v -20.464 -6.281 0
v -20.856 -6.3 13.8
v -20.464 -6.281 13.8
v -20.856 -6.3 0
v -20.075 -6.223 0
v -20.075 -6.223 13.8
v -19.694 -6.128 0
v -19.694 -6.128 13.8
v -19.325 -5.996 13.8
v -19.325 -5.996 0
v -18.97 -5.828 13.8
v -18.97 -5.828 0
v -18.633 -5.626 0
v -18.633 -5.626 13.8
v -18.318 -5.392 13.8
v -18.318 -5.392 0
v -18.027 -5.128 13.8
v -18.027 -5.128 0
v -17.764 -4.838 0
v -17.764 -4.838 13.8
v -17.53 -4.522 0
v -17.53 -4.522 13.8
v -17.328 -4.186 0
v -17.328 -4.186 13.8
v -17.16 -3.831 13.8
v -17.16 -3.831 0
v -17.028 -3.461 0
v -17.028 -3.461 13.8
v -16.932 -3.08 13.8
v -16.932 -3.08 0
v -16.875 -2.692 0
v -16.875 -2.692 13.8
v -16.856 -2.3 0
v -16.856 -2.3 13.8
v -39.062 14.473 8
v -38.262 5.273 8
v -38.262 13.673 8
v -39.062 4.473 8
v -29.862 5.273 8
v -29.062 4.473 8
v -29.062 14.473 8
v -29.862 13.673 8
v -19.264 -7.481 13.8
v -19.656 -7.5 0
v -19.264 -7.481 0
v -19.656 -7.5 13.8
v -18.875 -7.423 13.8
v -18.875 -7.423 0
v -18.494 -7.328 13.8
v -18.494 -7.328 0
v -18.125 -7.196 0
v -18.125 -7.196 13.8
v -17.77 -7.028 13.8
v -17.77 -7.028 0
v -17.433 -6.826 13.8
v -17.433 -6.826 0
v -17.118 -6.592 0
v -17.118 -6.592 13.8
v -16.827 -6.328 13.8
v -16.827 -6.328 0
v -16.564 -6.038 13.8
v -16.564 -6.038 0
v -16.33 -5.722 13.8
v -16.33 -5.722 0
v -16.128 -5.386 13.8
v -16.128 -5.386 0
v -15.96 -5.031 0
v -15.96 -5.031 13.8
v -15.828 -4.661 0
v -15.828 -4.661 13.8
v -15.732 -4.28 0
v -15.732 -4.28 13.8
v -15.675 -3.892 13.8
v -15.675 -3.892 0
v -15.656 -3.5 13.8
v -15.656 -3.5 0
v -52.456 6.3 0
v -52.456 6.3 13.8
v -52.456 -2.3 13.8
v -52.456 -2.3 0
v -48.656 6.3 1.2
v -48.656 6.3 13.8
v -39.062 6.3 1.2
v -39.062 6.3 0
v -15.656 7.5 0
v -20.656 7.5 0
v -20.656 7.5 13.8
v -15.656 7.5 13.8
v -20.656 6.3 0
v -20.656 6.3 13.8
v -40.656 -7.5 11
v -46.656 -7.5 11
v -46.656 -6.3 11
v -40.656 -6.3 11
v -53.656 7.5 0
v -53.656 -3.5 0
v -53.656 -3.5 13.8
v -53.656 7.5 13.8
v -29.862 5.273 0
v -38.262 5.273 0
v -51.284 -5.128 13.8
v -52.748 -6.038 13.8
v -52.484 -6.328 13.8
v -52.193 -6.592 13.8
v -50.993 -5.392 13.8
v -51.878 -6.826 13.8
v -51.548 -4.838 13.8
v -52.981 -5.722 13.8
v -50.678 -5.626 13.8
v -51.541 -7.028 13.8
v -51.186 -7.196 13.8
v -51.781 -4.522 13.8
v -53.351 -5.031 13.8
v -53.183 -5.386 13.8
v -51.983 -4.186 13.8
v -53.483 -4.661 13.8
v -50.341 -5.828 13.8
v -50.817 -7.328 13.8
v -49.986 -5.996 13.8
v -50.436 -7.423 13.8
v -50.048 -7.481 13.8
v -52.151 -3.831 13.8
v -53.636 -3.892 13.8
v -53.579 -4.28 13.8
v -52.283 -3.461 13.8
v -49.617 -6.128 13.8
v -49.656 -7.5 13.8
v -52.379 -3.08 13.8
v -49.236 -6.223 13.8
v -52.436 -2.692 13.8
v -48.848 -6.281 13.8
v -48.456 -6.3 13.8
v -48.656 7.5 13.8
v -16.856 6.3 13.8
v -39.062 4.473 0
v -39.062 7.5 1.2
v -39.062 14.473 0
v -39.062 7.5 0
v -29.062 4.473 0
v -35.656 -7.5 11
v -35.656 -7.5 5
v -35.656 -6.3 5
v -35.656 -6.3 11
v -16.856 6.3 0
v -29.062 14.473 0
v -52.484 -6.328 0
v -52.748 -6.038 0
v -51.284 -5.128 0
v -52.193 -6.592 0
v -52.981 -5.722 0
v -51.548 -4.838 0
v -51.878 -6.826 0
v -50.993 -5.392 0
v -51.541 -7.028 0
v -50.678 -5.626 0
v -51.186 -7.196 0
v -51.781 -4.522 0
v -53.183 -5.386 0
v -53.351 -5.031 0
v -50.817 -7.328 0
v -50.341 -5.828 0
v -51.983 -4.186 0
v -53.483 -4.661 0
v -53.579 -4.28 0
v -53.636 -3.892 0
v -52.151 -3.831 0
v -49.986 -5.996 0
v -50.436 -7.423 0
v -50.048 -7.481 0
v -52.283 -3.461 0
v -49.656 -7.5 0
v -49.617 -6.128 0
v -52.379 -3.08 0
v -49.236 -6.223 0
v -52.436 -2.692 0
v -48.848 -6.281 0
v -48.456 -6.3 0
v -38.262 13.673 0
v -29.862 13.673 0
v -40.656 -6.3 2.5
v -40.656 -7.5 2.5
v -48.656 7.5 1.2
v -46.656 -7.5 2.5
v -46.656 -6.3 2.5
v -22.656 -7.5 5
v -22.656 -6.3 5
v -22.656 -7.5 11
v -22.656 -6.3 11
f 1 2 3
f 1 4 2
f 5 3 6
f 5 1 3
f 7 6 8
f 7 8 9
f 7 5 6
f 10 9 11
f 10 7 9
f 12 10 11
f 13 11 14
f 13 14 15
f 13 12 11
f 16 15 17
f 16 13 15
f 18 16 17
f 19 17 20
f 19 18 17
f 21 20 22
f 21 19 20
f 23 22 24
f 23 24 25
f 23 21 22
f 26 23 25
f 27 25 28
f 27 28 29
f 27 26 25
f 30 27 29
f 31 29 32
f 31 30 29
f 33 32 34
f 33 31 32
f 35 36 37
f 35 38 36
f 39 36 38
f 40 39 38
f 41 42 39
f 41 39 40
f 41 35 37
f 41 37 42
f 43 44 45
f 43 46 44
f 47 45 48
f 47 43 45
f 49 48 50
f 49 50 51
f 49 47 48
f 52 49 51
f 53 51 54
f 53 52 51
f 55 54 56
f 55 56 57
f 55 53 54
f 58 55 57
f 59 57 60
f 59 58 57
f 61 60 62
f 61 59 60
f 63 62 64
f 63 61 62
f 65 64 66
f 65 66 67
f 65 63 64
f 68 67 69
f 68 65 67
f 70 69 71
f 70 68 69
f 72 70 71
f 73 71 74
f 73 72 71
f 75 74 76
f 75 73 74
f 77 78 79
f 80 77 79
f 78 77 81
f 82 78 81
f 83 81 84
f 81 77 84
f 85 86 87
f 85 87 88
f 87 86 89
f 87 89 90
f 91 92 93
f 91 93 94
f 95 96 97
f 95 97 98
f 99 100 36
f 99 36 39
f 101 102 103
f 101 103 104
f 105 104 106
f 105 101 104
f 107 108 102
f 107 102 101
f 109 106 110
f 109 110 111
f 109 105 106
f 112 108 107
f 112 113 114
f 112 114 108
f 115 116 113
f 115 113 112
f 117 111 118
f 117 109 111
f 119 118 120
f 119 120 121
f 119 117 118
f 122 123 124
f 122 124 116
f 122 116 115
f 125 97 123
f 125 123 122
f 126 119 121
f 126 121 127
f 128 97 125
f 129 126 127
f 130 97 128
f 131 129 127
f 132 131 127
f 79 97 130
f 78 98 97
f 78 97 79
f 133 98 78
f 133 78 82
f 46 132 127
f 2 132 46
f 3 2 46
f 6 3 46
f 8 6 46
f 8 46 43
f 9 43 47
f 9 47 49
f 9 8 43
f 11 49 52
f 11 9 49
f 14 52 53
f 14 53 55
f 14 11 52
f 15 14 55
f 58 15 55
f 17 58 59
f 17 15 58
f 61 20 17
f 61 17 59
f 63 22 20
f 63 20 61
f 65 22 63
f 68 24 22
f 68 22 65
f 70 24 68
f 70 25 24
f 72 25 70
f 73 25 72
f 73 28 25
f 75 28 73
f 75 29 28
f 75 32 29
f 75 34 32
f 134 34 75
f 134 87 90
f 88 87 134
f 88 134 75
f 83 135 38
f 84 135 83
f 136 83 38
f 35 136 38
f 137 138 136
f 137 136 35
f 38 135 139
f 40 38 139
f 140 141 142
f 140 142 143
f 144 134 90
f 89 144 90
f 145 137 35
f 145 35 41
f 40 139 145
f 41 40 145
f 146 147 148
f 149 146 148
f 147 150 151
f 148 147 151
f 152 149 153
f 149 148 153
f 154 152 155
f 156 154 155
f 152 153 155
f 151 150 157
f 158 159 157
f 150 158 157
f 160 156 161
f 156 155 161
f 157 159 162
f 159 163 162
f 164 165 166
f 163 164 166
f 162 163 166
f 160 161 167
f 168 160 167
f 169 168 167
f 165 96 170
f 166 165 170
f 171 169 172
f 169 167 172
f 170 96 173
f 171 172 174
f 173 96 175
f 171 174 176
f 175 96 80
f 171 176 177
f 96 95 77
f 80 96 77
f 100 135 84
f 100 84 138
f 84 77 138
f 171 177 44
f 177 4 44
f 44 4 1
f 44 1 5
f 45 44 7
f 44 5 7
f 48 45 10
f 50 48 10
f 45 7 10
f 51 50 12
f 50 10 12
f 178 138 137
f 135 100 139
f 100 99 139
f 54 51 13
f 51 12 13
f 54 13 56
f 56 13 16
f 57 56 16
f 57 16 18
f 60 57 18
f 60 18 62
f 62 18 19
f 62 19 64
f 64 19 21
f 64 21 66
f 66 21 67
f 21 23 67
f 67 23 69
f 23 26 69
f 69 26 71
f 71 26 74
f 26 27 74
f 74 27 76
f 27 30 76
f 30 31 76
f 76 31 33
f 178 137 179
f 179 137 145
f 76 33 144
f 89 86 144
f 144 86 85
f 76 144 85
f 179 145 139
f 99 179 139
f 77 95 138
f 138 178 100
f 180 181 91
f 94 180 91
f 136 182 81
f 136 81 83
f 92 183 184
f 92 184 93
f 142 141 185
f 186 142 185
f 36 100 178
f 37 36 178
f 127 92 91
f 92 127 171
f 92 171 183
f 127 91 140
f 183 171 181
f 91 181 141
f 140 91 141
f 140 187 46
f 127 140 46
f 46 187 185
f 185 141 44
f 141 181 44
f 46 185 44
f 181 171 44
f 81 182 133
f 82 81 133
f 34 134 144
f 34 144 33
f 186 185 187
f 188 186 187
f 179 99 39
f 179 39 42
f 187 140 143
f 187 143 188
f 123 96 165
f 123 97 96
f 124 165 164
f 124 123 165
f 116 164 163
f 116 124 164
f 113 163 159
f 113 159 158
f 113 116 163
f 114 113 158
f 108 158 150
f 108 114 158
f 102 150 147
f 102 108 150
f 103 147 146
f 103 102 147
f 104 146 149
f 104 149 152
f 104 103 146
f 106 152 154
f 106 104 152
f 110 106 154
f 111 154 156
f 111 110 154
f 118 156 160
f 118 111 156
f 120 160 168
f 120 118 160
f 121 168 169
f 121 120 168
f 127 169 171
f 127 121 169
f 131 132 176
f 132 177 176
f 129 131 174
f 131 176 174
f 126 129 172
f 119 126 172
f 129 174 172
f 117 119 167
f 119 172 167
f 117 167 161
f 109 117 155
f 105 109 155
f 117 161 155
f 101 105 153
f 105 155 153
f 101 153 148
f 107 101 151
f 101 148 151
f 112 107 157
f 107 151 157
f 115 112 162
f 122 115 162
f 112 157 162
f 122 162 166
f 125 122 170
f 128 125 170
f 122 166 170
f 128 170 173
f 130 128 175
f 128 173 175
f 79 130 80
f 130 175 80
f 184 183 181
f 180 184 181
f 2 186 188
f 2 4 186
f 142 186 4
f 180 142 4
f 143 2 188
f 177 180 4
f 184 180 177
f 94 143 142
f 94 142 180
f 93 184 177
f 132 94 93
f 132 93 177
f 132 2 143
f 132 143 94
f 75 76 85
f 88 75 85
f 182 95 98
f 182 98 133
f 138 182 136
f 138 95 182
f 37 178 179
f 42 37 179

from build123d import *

# Parameters (mm, degrees)
F0_W      = 38
F0_H      = 15
F1_DEPTH  = 15
F2_T      = -1.2
F3_W      = 13
F3_H      = 6
F3_W_2    = 6
F3_H_2    = 8.5
F4_DEPTH  = 1.2
F5_DEPTH  = 1.2
F6_DEPTH  = 25
F7_R      = 4
F8_W      = 28
F8_H      = 13.8
F9_DEPTH  = 1.2
F10_W     = 10
F10_H     = 10
F11_DEPTH = 8
F12_T     = -0.8
F13_DEPTH = 25
F14_W     = 9.5933079185
F14_H     = 1.2
F15_DEPTH = 1.2


with BuildPart() as f1:
    # F0 (on Top) → F1 (new body)
    with BuildSketch(Plane.XY):
        with Locations((-34.6555788131, 0)):
            Rectangle(F0_W, F0_H)
    extrude(amount=F1_DEPTH)

    # F2 (hollow: no face is removed)
    offset(amount=F2_T, mode=Mode.SUBTRACT)

    # F3 (on face) → F4 (cut, through all)
    with BuildSketch(Plane.XZ.offset(7.5)):
        with Locations((-29.1555788131, 8)):
            Rectangle(F3_W, F3_H)
        with Locations((-43.6555788131, 6.75)):
            Rectangle(F3_W_2, F3_H_2)
    extrude(amount=-F4_DEPTH, mode=Mode.SUBTRACT)

    # F5 (cut, through all): a face of the model
    f5_faces = [f1.faces().sort_by_distance(p)[0] for p in [
        (-34.6555788131, 0, 15),
    ]]
    extrude(f5_faces, amount=-F5_DEPTH, mode=Mode.SUBTRACT)

    # F6 (cut): a face of the model
    f6_faces = [f1.faces().sort_by_distance(p)[0] for p in [
        (-34.6555788131, 0, 1.2),
    ]]
    extrude(f6_faces, amount=-F6_DEPTH, mode=Mode.SUBTRACT)

    # F7
    f7_edges = [f1.edges().sort_by_distance(p)[0] for p in [
        (-15.655579, -7.5, 6.9),
        (-52.455579, -6.3, 6.9),
        (-53.655579, -7.5, 6.9),
        (-16.855579, -6.3, 6.9),
    ]]
    fillet(f7_edges, radius=F7_R)

    # F8 (on face) → F9 (cut, through all)
    with BuildSketch(Plane(origin=(0, 7.5, 0), x_dir=(-1, 0, 0), z_dir=(0, 1, 0))):
        with Locations((34.6555788131, 6.9)):
            Rectangle(F8_W, F8_H)
    extrude(amount=-F9_DEPTH, mode=Mode.SUBTRACT)



with BuildPart() as f11:
    # F10 (on Top) → F11 (new body)
    with BuildSketch(Plane.XY):
        with Locations((-34.0622708946, 9.4726205524)):
            Rectangle(F10_W, F10_H)
    extrude(amount=F11_DEPTH)

    # F12
    f12_openings = [f11.faces().sort_by_distance(p)[0] for p in [
        (-34.062271, 9.472621, 0),
    ]]
    offset(amount=F12_T, openings=f12_openings)

    # F13 (cut): a face of the model
    f13_faces = [f11.faces().sort_by_distance(p)[0] for p in [
        (-34.0622708946, 9.4726205524, 7.2),
    ]]
    extrude(f13_faces, amount=-F13_DEPTH, mode=Mode.SUBTRACT)


with BuildPart() as f1_1:
    add(f1.part)

    add(f11.part)  # F15 merges F11
    # F14 (on Top) → F15 (join)
    with BuildSketch(Plane.XY):
        with Locations((-43.8589248539, 6.9)):
            Rectangle(F14_W, F14_H)
    extrude(amount=F15_DEPTH)


solid = f1_1.part
